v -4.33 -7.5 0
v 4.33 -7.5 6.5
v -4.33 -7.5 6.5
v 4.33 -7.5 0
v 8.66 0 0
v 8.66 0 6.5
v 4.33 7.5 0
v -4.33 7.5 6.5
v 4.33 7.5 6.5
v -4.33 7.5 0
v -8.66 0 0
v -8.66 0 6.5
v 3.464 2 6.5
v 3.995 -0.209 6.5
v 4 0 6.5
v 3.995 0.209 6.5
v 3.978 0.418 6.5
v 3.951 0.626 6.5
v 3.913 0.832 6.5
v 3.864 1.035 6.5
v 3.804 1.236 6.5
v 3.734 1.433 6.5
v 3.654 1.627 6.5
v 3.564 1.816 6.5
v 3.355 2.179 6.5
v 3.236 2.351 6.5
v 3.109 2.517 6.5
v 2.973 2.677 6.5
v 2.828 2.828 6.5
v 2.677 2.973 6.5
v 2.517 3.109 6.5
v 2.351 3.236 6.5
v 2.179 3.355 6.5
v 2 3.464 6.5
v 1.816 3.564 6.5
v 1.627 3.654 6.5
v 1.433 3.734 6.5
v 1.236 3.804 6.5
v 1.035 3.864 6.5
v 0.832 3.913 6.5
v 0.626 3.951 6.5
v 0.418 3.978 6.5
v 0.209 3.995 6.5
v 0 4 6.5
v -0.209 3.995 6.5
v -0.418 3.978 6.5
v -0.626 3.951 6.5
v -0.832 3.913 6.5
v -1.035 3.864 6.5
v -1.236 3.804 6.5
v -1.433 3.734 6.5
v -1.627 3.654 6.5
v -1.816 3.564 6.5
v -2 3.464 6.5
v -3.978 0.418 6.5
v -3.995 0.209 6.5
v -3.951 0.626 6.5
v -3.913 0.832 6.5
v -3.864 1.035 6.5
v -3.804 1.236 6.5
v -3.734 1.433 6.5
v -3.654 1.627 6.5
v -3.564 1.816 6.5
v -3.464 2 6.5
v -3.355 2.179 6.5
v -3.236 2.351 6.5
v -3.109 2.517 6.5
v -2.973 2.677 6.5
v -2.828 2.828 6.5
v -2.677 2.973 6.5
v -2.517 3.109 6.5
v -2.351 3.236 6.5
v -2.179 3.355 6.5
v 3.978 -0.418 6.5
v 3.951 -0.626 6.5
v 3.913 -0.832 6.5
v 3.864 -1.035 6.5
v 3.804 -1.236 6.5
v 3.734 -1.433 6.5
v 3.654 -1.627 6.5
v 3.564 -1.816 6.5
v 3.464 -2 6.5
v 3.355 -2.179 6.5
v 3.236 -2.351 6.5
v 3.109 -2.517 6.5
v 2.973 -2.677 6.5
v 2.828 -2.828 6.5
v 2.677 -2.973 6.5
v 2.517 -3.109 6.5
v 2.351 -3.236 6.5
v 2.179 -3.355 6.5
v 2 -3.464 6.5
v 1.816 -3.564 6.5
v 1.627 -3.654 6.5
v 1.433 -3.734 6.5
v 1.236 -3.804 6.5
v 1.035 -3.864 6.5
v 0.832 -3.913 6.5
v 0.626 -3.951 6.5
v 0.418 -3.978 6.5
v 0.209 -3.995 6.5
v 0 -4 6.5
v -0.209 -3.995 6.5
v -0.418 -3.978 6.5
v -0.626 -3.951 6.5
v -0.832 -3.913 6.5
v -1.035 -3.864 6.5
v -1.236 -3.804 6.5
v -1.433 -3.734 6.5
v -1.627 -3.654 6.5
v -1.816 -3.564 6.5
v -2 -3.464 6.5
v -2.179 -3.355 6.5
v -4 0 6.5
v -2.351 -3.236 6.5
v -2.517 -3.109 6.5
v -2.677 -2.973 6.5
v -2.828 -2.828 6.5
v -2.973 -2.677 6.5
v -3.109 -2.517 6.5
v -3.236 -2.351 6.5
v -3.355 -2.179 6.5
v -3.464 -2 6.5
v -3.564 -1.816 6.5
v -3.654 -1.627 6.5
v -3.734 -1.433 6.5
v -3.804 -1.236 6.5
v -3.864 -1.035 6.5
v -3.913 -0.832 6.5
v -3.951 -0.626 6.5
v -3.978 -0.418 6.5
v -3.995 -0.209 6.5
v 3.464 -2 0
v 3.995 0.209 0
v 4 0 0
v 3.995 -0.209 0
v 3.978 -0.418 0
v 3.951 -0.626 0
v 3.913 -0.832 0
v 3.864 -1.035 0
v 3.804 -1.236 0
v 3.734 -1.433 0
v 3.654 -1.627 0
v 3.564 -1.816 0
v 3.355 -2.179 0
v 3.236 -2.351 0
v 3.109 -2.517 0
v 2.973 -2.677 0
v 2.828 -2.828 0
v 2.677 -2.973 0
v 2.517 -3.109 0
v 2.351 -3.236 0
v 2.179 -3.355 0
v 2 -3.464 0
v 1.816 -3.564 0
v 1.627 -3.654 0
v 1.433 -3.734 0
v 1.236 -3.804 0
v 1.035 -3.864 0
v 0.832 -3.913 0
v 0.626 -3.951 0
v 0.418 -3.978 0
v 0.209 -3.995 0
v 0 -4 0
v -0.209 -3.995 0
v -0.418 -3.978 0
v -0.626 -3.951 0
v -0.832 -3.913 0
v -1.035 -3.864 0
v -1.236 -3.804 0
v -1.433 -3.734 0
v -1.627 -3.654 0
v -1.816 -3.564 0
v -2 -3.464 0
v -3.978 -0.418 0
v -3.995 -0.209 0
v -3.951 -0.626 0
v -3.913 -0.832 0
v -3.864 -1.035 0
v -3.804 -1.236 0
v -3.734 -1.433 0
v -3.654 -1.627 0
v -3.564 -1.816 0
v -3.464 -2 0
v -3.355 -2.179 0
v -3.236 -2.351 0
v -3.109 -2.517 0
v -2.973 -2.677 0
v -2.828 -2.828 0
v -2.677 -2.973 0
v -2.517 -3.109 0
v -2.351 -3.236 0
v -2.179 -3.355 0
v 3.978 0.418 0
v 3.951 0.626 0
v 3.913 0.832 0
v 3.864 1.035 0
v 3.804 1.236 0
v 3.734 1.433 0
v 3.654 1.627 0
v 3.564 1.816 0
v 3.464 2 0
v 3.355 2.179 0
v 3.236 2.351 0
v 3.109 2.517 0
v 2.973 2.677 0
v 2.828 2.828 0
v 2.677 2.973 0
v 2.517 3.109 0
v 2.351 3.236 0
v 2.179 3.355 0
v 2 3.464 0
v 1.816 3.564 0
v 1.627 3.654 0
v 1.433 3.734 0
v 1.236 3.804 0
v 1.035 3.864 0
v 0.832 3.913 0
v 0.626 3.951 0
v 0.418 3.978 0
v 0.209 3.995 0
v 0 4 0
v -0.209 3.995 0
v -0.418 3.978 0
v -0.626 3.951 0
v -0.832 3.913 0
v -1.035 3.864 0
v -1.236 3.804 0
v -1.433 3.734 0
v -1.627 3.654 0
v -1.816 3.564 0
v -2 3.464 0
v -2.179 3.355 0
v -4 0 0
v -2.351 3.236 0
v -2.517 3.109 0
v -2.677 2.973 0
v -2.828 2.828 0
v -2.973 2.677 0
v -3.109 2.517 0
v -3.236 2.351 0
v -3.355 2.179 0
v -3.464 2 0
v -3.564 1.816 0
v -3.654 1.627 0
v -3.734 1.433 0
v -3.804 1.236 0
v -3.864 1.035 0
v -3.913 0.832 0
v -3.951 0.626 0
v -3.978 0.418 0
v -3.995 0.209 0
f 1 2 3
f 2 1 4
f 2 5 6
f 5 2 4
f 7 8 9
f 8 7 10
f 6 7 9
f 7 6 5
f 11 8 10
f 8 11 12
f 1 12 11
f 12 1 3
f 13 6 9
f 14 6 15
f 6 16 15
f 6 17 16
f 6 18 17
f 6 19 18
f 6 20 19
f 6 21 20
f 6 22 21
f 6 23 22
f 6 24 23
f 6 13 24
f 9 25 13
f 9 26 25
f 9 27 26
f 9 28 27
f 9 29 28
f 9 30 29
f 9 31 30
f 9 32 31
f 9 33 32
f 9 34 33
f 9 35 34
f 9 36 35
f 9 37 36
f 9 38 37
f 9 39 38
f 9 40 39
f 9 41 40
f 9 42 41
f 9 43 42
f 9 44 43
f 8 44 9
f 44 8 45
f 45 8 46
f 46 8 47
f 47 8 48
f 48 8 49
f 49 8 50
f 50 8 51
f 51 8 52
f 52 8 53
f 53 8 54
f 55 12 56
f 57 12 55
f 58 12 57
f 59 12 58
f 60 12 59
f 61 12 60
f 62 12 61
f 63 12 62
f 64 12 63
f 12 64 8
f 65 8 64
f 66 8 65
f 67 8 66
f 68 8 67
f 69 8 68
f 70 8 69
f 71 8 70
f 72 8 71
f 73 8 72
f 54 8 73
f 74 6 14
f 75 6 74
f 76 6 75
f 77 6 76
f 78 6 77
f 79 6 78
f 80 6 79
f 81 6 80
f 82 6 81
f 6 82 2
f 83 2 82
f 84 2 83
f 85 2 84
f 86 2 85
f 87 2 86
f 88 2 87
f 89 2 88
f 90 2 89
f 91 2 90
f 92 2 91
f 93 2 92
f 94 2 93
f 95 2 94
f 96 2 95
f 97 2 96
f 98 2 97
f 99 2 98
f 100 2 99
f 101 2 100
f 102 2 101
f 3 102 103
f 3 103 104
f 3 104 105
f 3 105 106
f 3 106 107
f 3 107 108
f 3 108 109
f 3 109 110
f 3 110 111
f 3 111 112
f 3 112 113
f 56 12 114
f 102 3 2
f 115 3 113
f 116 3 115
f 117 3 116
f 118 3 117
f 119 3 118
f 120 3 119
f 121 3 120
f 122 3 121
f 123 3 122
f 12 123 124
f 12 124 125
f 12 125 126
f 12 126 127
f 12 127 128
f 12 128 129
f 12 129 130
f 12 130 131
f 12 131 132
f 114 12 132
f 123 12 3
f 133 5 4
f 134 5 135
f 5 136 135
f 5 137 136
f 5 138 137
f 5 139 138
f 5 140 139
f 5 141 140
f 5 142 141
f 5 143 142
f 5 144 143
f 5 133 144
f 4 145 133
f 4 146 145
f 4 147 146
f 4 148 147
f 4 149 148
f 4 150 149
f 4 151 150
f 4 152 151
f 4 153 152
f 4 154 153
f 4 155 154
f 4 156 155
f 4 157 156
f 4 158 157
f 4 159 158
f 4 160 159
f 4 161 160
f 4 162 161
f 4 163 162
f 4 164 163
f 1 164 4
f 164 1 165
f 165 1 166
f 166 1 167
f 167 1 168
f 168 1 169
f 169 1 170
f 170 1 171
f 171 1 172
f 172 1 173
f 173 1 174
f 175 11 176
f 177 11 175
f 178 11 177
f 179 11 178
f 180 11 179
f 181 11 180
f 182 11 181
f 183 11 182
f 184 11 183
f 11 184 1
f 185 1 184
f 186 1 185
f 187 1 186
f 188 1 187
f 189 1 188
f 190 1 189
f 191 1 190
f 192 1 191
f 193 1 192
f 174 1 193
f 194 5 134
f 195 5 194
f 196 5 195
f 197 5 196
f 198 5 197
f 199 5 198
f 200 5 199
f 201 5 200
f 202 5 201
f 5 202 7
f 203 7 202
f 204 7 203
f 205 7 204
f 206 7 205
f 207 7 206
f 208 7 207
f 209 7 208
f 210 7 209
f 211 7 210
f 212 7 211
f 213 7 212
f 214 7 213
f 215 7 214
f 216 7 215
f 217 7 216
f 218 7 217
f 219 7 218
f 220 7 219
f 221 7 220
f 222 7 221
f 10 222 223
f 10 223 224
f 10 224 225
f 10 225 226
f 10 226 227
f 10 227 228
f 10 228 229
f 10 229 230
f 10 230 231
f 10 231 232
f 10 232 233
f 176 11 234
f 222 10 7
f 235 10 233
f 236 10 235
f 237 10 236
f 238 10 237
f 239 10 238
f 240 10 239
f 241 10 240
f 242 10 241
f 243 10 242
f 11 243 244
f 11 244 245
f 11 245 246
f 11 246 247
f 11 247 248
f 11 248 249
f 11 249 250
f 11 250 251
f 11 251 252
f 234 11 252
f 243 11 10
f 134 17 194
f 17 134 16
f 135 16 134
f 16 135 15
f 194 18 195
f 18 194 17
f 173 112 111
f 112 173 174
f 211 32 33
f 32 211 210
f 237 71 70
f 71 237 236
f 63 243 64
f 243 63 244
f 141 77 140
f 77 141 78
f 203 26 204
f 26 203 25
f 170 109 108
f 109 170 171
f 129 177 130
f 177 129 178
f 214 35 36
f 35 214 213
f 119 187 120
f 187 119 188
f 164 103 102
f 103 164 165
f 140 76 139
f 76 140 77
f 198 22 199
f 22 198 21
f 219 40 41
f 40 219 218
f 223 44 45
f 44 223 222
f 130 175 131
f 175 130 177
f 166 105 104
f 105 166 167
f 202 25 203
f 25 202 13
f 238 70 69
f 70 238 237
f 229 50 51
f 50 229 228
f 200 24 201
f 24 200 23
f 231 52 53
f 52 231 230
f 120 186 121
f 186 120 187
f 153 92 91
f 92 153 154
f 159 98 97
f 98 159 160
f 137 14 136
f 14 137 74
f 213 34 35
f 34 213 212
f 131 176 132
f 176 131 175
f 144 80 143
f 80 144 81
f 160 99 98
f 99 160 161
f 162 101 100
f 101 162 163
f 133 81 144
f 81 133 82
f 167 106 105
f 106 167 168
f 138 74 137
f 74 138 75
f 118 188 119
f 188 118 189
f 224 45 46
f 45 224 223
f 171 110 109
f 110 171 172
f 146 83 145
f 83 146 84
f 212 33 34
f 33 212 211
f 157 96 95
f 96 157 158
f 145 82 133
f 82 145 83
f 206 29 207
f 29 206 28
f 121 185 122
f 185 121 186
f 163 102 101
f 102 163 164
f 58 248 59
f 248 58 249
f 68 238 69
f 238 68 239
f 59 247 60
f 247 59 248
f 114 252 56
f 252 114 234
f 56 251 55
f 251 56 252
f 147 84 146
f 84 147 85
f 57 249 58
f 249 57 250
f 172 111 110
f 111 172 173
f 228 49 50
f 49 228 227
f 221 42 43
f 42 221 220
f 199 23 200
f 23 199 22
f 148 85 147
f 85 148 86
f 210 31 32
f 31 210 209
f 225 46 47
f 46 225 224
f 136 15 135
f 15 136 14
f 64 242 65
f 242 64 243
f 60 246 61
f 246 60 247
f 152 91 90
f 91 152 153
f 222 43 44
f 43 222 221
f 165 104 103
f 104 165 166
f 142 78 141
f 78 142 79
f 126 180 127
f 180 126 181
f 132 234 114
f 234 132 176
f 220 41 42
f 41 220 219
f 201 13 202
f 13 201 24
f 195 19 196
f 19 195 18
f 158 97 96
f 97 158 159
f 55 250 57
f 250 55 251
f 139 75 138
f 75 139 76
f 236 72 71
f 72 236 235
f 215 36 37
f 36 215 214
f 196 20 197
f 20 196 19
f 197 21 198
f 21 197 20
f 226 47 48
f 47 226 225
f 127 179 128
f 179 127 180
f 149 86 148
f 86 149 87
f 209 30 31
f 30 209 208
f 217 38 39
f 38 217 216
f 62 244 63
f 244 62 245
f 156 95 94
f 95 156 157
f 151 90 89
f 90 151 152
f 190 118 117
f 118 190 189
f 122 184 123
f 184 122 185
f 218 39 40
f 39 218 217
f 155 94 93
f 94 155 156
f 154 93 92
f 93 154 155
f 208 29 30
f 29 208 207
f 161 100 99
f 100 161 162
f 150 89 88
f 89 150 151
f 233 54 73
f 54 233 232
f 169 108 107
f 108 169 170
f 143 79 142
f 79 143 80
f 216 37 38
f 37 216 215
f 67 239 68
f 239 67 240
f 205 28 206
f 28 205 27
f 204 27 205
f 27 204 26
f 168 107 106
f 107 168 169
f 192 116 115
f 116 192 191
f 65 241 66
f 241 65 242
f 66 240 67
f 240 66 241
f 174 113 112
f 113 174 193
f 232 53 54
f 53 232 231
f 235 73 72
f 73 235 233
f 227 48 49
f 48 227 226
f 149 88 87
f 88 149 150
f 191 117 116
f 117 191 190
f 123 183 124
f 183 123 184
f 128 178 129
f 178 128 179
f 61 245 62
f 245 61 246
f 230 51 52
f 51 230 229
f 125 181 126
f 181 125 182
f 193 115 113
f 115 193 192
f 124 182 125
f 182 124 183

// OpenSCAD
$fn = 120;

screw_d = 8.0;          // mm (clearance hole)
across_flats = 15.0;    // mm
thickness = 6.5;        // mm

// Convert across-flats to circumradius for a regular hexagon
R = across_flats / sqrt(3);

difference() {
    // Hex body
    cylinder(h = thickness, r = R, $fn = 6);

    // Through hole
    translate([0, 0, -0.5])
        cylinder(h = thickness + 1.0, d = screw_d, $fn = 120);
}
